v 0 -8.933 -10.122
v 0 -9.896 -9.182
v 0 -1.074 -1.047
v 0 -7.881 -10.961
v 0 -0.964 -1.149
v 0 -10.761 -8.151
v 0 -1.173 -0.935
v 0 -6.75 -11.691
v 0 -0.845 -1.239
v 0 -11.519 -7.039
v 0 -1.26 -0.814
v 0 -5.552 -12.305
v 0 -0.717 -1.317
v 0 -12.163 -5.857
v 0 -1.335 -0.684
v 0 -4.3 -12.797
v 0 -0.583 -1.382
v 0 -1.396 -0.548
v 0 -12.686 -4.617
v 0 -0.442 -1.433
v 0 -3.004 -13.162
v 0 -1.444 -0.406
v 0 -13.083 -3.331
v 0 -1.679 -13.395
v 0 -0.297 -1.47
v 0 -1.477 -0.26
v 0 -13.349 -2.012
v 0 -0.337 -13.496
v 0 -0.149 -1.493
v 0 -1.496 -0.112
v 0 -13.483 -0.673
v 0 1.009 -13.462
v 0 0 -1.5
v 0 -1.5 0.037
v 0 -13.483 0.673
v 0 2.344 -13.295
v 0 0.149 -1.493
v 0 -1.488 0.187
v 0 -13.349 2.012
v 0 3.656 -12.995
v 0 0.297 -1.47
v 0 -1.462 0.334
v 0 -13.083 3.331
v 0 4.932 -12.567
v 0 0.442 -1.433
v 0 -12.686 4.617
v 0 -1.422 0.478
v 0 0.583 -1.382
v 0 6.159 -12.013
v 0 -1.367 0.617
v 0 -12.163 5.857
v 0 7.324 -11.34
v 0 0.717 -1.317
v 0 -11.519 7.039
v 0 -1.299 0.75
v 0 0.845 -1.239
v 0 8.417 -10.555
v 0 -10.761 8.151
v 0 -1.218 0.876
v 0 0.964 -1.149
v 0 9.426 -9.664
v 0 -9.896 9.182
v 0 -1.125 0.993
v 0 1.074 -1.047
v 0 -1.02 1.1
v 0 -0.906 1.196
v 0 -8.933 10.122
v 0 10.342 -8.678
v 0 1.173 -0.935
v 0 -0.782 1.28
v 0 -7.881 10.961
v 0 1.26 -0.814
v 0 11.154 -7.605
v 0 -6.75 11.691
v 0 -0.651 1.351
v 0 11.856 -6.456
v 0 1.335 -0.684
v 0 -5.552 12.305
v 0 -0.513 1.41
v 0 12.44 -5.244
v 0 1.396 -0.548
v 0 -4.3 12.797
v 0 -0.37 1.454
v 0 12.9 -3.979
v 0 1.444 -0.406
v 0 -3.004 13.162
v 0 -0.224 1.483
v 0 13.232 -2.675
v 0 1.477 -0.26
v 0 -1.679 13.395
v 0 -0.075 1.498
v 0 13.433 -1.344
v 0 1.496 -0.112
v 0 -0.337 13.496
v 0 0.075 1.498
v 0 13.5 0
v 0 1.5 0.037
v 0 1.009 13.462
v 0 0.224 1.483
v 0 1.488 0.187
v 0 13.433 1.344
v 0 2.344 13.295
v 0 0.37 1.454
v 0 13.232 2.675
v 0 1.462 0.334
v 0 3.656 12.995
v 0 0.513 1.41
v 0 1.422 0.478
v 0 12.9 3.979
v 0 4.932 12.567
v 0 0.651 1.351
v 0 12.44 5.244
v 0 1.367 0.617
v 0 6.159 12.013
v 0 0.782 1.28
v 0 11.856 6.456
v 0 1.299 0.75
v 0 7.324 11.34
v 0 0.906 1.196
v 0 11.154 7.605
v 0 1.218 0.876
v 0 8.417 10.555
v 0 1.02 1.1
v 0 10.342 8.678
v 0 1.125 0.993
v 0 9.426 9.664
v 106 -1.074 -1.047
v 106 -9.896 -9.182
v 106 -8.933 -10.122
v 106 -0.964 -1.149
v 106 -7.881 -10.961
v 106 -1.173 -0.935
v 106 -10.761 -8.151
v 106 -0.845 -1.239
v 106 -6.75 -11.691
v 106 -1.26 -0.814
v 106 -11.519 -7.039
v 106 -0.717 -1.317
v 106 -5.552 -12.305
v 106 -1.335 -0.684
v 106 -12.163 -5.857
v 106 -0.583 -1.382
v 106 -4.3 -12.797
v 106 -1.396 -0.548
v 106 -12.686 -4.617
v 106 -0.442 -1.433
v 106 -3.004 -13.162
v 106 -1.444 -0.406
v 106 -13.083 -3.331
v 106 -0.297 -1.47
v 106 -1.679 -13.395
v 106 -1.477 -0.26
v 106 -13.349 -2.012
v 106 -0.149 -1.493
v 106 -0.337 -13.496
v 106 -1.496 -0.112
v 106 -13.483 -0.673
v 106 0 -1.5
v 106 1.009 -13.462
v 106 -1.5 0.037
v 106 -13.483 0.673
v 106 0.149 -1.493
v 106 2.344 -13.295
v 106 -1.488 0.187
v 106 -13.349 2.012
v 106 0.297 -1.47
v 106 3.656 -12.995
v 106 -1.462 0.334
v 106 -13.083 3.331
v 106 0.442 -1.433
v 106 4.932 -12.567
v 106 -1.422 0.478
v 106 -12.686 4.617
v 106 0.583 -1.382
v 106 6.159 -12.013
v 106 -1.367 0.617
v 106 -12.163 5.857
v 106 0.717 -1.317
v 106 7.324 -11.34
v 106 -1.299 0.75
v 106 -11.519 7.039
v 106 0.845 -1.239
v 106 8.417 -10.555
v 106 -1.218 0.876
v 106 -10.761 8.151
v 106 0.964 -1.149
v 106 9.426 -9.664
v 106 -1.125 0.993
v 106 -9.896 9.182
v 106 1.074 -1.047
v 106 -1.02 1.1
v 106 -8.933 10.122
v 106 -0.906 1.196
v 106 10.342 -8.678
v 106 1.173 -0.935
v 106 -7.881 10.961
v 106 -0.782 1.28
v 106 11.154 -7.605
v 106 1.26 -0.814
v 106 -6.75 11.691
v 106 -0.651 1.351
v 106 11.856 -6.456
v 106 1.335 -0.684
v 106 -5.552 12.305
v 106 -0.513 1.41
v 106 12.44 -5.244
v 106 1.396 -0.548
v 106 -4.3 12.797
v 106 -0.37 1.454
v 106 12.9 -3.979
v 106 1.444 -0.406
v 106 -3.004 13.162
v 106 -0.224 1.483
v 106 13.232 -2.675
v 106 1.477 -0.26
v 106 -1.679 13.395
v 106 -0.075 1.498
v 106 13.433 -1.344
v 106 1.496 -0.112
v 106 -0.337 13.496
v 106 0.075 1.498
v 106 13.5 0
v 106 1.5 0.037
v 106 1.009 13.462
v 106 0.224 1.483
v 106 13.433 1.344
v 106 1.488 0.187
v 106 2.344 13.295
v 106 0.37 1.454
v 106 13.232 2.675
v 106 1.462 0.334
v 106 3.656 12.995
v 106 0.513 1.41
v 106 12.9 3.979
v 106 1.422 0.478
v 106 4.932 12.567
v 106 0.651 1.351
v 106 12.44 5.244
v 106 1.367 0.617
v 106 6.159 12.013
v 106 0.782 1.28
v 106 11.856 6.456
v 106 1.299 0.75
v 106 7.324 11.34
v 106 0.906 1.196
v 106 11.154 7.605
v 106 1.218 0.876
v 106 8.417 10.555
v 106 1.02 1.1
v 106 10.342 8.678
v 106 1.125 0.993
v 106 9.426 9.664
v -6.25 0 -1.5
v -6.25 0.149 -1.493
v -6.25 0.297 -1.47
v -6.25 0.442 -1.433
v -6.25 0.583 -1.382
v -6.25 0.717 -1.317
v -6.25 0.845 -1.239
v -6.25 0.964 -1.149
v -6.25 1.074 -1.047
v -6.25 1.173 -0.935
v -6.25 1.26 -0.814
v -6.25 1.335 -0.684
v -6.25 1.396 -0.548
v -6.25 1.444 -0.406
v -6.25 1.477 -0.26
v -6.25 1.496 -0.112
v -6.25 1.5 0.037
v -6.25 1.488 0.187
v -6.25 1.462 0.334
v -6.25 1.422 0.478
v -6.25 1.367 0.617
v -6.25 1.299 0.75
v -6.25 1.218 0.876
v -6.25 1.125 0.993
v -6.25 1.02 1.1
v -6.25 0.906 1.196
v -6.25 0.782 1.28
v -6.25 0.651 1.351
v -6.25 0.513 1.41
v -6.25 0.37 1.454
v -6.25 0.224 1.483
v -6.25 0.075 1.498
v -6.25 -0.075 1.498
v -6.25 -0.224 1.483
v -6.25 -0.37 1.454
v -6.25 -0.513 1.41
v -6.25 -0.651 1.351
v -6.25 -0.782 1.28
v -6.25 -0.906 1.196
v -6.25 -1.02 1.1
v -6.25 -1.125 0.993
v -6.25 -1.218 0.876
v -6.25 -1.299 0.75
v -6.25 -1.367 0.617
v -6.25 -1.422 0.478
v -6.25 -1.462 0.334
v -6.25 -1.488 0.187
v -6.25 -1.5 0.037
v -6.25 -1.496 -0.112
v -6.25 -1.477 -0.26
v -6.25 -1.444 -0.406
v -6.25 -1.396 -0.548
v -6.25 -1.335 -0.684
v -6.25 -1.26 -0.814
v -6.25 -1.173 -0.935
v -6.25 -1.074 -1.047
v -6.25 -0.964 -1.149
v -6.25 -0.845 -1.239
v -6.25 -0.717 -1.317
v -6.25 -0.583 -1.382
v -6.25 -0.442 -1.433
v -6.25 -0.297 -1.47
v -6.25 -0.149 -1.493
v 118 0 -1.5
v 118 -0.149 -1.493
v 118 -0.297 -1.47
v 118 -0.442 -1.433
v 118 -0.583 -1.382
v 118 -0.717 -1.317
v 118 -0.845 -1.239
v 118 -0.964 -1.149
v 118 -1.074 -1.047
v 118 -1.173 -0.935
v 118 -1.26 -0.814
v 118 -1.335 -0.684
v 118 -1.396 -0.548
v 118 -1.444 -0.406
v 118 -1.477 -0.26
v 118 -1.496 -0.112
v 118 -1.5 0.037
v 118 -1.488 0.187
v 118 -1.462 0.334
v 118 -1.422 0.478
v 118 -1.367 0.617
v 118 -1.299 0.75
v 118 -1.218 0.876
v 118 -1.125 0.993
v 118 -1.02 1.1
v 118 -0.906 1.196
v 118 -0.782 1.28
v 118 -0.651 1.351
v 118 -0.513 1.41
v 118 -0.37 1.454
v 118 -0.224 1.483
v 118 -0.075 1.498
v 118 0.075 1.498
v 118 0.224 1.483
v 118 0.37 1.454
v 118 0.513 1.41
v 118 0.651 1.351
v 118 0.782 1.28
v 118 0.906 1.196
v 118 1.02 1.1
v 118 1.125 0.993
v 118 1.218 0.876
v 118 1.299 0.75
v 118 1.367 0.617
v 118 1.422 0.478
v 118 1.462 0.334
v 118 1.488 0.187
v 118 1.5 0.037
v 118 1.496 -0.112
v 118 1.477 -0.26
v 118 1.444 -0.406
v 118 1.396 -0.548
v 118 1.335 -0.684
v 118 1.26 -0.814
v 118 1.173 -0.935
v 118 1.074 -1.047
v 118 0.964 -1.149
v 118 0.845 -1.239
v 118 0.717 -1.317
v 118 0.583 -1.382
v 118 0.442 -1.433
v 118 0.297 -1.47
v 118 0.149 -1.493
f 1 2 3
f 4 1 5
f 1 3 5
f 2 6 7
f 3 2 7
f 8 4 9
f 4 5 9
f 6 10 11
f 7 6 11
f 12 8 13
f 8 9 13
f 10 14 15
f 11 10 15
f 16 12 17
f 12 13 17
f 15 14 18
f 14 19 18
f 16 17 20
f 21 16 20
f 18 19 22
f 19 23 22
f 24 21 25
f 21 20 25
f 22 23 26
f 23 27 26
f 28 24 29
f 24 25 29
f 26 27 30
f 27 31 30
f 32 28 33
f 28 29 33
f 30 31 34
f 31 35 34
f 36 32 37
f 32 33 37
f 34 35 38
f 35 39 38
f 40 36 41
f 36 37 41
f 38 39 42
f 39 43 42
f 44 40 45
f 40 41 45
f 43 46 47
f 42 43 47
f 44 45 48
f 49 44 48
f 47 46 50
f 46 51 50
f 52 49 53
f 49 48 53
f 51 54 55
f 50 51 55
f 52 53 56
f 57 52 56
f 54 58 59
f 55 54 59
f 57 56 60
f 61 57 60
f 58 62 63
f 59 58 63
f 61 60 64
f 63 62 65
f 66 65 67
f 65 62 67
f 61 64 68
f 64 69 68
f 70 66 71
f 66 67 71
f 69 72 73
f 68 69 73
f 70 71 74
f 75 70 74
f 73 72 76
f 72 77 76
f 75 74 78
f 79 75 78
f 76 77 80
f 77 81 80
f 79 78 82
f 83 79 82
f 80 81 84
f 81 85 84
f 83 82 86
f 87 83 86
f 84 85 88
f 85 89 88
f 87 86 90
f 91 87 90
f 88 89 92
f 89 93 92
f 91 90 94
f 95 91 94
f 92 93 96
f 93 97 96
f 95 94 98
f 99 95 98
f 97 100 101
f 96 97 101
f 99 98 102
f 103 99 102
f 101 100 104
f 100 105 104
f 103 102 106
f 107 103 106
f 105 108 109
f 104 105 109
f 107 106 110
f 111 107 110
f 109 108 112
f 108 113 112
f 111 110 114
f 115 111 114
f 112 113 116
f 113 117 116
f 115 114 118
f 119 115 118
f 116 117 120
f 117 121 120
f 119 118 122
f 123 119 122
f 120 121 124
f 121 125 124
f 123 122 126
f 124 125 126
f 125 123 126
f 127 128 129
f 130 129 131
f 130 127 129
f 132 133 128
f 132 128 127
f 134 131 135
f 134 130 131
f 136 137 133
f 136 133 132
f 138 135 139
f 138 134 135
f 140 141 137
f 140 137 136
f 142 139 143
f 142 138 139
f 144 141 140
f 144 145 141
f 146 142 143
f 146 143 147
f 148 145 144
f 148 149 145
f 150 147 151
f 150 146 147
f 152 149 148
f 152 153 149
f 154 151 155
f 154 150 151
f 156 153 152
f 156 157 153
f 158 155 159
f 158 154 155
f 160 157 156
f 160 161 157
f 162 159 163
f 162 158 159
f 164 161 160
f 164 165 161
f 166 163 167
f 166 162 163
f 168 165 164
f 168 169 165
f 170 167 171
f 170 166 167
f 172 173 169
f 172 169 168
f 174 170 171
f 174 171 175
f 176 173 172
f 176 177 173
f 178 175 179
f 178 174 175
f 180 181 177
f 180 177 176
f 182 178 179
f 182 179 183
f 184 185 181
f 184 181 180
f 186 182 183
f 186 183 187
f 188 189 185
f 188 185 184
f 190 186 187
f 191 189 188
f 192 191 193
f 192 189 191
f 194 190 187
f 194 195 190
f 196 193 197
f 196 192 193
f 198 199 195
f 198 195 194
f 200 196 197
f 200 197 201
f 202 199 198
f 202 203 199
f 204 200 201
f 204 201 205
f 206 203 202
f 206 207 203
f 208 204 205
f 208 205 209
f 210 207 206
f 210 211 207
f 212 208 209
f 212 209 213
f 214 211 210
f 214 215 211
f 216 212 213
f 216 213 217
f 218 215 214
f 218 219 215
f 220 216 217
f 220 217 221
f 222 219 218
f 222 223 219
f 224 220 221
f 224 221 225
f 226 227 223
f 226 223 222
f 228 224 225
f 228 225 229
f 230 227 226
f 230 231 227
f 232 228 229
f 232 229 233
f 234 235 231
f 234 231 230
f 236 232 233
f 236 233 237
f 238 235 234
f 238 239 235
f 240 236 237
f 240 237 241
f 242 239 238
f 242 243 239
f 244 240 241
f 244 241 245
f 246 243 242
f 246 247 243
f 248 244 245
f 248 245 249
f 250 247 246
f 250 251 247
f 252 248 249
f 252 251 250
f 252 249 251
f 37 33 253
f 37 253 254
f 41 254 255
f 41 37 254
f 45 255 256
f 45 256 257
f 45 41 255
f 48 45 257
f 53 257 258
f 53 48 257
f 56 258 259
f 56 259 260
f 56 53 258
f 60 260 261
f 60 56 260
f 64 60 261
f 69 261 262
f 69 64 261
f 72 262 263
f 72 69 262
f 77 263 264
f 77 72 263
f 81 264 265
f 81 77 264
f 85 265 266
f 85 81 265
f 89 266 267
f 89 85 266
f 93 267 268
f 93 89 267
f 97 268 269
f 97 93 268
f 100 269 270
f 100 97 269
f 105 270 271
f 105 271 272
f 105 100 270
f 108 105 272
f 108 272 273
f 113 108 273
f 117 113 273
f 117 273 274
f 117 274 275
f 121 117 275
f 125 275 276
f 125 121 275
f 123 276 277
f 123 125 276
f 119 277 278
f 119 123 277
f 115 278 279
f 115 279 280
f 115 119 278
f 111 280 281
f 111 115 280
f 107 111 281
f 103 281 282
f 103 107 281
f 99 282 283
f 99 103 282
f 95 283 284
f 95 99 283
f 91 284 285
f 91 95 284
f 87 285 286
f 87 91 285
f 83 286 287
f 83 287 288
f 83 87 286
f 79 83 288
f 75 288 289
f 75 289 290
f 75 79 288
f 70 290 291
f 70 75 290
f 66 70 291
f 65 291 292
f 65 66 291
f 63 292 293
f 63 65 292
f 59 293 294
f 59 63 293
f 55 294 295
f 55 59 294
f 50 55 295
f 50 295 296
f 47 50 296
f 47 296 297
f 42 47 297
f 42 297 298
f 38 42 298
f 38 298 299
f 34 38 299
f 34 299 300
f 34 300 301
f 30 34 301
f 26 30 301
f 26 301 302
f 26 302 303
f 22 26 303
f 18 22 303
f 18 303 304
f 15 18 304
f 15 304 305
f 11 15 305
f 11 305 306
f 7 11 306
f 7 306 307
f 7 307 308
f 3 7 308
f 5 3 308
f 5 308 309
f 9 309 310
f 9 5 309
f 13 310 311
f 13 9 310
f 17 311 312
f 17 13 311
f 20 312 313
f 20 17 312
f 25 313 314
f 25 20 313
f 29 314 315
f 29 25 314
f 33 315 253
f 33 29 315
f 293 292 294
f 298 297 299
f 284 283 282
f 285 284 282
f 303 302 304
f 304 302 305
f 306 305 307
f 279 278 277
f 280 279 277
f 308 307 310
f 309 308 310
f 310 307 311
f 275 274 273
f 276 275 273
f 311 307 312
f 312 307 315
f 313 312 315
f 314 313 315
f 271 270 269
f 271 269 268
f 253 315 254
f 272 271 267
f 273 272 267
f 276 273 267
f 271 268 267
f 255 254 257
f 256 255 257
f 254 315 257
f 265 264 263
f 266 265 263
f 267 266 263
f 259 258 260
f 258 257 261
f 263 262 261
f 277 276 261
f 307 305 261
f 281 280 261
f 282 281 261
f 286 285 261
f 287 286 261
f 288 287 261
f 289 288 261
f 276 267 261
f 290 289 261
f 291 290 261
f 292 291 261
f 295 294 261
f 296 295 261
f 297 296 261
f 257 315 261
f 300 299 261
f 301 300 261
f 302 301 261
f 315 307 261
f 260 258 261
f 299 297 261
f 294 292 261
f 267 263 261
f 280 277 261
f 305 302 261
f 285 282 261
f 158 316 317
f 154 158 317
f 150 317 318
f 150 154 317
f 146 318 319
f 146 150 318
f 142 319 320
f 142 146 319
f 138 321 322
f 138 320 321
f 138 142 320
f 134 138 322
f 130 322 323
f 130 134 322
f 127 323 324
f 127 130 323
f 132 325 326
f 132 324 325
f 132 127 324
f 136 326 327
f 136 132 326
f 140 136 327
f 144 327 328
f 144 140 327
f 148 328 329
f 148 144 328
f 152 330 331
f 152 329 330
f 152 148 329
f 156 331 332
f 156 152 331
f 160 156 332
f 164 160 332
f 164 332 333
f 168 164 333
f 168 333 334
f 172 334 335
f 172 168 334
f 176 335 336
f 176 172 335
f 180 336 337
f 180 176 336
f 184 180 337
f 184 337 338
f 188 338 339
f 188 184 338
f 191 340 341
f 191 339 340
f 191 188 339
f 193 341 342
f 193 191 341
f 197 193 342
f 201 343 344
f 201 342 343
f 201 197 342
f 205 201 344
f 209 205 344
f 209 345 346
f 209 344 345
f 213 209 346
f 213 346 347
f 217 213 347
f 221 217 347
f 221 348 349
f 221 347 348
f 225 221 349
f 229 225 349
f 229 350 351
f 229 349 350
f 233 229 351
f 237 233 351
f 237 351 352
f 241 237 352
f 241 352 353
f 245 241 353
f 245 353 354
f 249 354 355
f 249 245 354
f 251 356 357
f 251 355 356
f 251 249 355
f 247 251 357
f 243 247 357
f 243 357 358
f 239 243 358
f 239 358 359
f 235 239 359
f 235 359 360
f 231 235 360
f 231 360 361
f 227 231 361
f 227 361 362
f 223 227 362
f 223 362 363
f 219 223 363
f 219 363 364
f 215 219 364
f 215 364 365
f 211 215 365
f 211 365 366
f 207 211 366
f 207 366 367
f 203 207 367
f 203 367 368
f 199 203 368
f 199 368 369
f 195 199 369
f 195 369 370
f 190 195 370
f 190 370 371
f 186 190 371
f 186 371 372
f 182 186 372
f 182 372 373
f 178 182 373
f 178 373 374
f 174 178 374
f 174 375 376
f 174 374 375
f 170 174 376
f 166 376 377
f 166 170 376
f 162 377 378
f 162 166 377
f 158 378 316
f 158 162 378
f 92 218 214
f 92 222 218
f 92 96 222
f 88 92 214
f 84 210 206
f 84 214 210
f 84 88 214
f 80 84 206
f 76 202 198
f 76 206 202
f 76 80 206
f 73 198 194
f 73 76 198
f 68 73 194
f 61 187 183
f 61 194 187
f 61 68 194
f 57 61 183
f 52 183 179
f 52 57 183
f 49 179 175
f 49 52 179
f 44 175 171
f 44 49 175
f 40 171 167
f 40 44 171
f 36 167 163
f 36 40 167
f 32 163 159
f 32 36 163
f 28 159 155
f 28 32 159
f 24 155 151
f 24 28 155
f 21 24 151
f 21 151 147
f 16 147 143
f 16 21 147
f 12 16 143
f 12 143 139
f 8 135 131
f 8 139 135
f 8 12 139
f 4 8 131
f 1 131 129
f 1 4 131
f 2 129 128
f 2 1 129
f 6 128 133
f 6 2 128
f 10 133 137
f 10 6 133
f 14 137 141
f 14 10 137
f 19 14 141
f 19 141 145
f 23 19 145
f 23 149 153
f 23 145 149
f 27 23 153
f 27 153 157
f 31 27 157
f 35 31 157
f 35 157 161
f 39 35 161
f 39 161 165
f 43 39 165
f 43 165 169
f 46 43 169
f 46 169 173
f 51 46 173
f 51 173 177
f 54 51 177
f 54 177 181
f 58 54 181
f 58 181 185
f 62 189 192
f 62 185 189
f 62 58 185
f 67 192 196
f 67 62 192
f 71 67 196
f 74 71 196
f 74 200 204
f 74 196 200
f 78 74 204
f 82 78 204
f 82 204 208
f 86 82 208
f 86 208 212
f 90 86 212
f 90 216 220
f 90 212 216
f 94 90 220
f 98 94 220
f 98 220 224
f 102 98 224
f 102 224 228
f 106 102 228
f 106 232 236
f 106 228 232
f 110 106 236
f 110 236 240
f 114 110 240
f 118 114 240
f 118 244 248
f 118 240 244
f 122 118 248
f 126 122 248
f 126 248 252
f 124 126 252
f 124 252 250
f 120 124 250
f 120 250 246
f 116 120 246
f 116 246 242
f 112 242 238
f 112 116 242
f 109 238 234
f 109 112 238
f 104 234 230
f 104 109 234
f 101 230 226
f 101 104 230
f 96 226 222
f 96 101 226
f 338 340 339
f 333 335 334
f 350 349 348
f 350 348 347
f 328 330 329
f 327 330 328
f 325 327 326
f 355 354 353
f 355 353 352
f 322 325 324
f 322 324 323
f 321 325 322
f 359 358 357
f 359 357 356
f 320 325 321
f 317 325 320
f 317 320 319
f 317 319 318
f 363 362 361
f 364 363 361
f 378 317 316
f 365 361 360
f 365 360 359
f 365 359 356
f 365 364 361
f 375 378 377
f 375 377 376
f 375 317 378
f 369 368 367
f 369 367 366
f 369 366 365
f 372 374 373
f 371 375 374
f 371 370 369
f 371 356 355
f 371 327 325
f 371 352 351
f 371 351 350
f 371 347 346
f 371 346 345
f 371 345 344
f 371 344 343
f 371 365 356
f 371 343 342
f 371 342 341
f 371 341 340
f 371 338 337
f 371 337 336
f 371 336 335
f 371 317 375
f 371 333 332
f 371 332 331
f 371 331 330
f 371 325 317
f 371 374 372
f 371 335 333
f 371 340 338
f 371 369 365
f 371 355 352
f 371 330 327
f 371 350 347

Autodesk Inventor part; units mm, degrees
ref_plane "YZ Plane" through (0, 0, 0) normal (1, 0, 0) x (0, 1, 0)
ref_plane "XZ Plane" through (0, 0, 0) normal (0, 1, 0) x (-1, 0, 0)
ref_plane "XY Plane" through (0, 0, 0) normal (0, 0, 1) x (1, 0, 0)
sketch "Sketch1" plane through (0, 0, 0) normal (1, 0, 0) x (0, 1, 0)
  circle A0 centre (0, 0) radius 13.5
  dimension "d0" = 27
extrude "Extrusion1" add sketch "Sketch1" along normal blind 106
sketch "Sketch2" plane through (106, 0, 0) normal (1, 0, 0) x (0, 0, -1)
  circle A0 centre (0, 0) radius 1.5
  dimension "d3" = 3
extrude "Extrusion2" add sketch "Sketch2" along normal blind 12 and the other way blind 112.25
properties part number "ROLLER"
